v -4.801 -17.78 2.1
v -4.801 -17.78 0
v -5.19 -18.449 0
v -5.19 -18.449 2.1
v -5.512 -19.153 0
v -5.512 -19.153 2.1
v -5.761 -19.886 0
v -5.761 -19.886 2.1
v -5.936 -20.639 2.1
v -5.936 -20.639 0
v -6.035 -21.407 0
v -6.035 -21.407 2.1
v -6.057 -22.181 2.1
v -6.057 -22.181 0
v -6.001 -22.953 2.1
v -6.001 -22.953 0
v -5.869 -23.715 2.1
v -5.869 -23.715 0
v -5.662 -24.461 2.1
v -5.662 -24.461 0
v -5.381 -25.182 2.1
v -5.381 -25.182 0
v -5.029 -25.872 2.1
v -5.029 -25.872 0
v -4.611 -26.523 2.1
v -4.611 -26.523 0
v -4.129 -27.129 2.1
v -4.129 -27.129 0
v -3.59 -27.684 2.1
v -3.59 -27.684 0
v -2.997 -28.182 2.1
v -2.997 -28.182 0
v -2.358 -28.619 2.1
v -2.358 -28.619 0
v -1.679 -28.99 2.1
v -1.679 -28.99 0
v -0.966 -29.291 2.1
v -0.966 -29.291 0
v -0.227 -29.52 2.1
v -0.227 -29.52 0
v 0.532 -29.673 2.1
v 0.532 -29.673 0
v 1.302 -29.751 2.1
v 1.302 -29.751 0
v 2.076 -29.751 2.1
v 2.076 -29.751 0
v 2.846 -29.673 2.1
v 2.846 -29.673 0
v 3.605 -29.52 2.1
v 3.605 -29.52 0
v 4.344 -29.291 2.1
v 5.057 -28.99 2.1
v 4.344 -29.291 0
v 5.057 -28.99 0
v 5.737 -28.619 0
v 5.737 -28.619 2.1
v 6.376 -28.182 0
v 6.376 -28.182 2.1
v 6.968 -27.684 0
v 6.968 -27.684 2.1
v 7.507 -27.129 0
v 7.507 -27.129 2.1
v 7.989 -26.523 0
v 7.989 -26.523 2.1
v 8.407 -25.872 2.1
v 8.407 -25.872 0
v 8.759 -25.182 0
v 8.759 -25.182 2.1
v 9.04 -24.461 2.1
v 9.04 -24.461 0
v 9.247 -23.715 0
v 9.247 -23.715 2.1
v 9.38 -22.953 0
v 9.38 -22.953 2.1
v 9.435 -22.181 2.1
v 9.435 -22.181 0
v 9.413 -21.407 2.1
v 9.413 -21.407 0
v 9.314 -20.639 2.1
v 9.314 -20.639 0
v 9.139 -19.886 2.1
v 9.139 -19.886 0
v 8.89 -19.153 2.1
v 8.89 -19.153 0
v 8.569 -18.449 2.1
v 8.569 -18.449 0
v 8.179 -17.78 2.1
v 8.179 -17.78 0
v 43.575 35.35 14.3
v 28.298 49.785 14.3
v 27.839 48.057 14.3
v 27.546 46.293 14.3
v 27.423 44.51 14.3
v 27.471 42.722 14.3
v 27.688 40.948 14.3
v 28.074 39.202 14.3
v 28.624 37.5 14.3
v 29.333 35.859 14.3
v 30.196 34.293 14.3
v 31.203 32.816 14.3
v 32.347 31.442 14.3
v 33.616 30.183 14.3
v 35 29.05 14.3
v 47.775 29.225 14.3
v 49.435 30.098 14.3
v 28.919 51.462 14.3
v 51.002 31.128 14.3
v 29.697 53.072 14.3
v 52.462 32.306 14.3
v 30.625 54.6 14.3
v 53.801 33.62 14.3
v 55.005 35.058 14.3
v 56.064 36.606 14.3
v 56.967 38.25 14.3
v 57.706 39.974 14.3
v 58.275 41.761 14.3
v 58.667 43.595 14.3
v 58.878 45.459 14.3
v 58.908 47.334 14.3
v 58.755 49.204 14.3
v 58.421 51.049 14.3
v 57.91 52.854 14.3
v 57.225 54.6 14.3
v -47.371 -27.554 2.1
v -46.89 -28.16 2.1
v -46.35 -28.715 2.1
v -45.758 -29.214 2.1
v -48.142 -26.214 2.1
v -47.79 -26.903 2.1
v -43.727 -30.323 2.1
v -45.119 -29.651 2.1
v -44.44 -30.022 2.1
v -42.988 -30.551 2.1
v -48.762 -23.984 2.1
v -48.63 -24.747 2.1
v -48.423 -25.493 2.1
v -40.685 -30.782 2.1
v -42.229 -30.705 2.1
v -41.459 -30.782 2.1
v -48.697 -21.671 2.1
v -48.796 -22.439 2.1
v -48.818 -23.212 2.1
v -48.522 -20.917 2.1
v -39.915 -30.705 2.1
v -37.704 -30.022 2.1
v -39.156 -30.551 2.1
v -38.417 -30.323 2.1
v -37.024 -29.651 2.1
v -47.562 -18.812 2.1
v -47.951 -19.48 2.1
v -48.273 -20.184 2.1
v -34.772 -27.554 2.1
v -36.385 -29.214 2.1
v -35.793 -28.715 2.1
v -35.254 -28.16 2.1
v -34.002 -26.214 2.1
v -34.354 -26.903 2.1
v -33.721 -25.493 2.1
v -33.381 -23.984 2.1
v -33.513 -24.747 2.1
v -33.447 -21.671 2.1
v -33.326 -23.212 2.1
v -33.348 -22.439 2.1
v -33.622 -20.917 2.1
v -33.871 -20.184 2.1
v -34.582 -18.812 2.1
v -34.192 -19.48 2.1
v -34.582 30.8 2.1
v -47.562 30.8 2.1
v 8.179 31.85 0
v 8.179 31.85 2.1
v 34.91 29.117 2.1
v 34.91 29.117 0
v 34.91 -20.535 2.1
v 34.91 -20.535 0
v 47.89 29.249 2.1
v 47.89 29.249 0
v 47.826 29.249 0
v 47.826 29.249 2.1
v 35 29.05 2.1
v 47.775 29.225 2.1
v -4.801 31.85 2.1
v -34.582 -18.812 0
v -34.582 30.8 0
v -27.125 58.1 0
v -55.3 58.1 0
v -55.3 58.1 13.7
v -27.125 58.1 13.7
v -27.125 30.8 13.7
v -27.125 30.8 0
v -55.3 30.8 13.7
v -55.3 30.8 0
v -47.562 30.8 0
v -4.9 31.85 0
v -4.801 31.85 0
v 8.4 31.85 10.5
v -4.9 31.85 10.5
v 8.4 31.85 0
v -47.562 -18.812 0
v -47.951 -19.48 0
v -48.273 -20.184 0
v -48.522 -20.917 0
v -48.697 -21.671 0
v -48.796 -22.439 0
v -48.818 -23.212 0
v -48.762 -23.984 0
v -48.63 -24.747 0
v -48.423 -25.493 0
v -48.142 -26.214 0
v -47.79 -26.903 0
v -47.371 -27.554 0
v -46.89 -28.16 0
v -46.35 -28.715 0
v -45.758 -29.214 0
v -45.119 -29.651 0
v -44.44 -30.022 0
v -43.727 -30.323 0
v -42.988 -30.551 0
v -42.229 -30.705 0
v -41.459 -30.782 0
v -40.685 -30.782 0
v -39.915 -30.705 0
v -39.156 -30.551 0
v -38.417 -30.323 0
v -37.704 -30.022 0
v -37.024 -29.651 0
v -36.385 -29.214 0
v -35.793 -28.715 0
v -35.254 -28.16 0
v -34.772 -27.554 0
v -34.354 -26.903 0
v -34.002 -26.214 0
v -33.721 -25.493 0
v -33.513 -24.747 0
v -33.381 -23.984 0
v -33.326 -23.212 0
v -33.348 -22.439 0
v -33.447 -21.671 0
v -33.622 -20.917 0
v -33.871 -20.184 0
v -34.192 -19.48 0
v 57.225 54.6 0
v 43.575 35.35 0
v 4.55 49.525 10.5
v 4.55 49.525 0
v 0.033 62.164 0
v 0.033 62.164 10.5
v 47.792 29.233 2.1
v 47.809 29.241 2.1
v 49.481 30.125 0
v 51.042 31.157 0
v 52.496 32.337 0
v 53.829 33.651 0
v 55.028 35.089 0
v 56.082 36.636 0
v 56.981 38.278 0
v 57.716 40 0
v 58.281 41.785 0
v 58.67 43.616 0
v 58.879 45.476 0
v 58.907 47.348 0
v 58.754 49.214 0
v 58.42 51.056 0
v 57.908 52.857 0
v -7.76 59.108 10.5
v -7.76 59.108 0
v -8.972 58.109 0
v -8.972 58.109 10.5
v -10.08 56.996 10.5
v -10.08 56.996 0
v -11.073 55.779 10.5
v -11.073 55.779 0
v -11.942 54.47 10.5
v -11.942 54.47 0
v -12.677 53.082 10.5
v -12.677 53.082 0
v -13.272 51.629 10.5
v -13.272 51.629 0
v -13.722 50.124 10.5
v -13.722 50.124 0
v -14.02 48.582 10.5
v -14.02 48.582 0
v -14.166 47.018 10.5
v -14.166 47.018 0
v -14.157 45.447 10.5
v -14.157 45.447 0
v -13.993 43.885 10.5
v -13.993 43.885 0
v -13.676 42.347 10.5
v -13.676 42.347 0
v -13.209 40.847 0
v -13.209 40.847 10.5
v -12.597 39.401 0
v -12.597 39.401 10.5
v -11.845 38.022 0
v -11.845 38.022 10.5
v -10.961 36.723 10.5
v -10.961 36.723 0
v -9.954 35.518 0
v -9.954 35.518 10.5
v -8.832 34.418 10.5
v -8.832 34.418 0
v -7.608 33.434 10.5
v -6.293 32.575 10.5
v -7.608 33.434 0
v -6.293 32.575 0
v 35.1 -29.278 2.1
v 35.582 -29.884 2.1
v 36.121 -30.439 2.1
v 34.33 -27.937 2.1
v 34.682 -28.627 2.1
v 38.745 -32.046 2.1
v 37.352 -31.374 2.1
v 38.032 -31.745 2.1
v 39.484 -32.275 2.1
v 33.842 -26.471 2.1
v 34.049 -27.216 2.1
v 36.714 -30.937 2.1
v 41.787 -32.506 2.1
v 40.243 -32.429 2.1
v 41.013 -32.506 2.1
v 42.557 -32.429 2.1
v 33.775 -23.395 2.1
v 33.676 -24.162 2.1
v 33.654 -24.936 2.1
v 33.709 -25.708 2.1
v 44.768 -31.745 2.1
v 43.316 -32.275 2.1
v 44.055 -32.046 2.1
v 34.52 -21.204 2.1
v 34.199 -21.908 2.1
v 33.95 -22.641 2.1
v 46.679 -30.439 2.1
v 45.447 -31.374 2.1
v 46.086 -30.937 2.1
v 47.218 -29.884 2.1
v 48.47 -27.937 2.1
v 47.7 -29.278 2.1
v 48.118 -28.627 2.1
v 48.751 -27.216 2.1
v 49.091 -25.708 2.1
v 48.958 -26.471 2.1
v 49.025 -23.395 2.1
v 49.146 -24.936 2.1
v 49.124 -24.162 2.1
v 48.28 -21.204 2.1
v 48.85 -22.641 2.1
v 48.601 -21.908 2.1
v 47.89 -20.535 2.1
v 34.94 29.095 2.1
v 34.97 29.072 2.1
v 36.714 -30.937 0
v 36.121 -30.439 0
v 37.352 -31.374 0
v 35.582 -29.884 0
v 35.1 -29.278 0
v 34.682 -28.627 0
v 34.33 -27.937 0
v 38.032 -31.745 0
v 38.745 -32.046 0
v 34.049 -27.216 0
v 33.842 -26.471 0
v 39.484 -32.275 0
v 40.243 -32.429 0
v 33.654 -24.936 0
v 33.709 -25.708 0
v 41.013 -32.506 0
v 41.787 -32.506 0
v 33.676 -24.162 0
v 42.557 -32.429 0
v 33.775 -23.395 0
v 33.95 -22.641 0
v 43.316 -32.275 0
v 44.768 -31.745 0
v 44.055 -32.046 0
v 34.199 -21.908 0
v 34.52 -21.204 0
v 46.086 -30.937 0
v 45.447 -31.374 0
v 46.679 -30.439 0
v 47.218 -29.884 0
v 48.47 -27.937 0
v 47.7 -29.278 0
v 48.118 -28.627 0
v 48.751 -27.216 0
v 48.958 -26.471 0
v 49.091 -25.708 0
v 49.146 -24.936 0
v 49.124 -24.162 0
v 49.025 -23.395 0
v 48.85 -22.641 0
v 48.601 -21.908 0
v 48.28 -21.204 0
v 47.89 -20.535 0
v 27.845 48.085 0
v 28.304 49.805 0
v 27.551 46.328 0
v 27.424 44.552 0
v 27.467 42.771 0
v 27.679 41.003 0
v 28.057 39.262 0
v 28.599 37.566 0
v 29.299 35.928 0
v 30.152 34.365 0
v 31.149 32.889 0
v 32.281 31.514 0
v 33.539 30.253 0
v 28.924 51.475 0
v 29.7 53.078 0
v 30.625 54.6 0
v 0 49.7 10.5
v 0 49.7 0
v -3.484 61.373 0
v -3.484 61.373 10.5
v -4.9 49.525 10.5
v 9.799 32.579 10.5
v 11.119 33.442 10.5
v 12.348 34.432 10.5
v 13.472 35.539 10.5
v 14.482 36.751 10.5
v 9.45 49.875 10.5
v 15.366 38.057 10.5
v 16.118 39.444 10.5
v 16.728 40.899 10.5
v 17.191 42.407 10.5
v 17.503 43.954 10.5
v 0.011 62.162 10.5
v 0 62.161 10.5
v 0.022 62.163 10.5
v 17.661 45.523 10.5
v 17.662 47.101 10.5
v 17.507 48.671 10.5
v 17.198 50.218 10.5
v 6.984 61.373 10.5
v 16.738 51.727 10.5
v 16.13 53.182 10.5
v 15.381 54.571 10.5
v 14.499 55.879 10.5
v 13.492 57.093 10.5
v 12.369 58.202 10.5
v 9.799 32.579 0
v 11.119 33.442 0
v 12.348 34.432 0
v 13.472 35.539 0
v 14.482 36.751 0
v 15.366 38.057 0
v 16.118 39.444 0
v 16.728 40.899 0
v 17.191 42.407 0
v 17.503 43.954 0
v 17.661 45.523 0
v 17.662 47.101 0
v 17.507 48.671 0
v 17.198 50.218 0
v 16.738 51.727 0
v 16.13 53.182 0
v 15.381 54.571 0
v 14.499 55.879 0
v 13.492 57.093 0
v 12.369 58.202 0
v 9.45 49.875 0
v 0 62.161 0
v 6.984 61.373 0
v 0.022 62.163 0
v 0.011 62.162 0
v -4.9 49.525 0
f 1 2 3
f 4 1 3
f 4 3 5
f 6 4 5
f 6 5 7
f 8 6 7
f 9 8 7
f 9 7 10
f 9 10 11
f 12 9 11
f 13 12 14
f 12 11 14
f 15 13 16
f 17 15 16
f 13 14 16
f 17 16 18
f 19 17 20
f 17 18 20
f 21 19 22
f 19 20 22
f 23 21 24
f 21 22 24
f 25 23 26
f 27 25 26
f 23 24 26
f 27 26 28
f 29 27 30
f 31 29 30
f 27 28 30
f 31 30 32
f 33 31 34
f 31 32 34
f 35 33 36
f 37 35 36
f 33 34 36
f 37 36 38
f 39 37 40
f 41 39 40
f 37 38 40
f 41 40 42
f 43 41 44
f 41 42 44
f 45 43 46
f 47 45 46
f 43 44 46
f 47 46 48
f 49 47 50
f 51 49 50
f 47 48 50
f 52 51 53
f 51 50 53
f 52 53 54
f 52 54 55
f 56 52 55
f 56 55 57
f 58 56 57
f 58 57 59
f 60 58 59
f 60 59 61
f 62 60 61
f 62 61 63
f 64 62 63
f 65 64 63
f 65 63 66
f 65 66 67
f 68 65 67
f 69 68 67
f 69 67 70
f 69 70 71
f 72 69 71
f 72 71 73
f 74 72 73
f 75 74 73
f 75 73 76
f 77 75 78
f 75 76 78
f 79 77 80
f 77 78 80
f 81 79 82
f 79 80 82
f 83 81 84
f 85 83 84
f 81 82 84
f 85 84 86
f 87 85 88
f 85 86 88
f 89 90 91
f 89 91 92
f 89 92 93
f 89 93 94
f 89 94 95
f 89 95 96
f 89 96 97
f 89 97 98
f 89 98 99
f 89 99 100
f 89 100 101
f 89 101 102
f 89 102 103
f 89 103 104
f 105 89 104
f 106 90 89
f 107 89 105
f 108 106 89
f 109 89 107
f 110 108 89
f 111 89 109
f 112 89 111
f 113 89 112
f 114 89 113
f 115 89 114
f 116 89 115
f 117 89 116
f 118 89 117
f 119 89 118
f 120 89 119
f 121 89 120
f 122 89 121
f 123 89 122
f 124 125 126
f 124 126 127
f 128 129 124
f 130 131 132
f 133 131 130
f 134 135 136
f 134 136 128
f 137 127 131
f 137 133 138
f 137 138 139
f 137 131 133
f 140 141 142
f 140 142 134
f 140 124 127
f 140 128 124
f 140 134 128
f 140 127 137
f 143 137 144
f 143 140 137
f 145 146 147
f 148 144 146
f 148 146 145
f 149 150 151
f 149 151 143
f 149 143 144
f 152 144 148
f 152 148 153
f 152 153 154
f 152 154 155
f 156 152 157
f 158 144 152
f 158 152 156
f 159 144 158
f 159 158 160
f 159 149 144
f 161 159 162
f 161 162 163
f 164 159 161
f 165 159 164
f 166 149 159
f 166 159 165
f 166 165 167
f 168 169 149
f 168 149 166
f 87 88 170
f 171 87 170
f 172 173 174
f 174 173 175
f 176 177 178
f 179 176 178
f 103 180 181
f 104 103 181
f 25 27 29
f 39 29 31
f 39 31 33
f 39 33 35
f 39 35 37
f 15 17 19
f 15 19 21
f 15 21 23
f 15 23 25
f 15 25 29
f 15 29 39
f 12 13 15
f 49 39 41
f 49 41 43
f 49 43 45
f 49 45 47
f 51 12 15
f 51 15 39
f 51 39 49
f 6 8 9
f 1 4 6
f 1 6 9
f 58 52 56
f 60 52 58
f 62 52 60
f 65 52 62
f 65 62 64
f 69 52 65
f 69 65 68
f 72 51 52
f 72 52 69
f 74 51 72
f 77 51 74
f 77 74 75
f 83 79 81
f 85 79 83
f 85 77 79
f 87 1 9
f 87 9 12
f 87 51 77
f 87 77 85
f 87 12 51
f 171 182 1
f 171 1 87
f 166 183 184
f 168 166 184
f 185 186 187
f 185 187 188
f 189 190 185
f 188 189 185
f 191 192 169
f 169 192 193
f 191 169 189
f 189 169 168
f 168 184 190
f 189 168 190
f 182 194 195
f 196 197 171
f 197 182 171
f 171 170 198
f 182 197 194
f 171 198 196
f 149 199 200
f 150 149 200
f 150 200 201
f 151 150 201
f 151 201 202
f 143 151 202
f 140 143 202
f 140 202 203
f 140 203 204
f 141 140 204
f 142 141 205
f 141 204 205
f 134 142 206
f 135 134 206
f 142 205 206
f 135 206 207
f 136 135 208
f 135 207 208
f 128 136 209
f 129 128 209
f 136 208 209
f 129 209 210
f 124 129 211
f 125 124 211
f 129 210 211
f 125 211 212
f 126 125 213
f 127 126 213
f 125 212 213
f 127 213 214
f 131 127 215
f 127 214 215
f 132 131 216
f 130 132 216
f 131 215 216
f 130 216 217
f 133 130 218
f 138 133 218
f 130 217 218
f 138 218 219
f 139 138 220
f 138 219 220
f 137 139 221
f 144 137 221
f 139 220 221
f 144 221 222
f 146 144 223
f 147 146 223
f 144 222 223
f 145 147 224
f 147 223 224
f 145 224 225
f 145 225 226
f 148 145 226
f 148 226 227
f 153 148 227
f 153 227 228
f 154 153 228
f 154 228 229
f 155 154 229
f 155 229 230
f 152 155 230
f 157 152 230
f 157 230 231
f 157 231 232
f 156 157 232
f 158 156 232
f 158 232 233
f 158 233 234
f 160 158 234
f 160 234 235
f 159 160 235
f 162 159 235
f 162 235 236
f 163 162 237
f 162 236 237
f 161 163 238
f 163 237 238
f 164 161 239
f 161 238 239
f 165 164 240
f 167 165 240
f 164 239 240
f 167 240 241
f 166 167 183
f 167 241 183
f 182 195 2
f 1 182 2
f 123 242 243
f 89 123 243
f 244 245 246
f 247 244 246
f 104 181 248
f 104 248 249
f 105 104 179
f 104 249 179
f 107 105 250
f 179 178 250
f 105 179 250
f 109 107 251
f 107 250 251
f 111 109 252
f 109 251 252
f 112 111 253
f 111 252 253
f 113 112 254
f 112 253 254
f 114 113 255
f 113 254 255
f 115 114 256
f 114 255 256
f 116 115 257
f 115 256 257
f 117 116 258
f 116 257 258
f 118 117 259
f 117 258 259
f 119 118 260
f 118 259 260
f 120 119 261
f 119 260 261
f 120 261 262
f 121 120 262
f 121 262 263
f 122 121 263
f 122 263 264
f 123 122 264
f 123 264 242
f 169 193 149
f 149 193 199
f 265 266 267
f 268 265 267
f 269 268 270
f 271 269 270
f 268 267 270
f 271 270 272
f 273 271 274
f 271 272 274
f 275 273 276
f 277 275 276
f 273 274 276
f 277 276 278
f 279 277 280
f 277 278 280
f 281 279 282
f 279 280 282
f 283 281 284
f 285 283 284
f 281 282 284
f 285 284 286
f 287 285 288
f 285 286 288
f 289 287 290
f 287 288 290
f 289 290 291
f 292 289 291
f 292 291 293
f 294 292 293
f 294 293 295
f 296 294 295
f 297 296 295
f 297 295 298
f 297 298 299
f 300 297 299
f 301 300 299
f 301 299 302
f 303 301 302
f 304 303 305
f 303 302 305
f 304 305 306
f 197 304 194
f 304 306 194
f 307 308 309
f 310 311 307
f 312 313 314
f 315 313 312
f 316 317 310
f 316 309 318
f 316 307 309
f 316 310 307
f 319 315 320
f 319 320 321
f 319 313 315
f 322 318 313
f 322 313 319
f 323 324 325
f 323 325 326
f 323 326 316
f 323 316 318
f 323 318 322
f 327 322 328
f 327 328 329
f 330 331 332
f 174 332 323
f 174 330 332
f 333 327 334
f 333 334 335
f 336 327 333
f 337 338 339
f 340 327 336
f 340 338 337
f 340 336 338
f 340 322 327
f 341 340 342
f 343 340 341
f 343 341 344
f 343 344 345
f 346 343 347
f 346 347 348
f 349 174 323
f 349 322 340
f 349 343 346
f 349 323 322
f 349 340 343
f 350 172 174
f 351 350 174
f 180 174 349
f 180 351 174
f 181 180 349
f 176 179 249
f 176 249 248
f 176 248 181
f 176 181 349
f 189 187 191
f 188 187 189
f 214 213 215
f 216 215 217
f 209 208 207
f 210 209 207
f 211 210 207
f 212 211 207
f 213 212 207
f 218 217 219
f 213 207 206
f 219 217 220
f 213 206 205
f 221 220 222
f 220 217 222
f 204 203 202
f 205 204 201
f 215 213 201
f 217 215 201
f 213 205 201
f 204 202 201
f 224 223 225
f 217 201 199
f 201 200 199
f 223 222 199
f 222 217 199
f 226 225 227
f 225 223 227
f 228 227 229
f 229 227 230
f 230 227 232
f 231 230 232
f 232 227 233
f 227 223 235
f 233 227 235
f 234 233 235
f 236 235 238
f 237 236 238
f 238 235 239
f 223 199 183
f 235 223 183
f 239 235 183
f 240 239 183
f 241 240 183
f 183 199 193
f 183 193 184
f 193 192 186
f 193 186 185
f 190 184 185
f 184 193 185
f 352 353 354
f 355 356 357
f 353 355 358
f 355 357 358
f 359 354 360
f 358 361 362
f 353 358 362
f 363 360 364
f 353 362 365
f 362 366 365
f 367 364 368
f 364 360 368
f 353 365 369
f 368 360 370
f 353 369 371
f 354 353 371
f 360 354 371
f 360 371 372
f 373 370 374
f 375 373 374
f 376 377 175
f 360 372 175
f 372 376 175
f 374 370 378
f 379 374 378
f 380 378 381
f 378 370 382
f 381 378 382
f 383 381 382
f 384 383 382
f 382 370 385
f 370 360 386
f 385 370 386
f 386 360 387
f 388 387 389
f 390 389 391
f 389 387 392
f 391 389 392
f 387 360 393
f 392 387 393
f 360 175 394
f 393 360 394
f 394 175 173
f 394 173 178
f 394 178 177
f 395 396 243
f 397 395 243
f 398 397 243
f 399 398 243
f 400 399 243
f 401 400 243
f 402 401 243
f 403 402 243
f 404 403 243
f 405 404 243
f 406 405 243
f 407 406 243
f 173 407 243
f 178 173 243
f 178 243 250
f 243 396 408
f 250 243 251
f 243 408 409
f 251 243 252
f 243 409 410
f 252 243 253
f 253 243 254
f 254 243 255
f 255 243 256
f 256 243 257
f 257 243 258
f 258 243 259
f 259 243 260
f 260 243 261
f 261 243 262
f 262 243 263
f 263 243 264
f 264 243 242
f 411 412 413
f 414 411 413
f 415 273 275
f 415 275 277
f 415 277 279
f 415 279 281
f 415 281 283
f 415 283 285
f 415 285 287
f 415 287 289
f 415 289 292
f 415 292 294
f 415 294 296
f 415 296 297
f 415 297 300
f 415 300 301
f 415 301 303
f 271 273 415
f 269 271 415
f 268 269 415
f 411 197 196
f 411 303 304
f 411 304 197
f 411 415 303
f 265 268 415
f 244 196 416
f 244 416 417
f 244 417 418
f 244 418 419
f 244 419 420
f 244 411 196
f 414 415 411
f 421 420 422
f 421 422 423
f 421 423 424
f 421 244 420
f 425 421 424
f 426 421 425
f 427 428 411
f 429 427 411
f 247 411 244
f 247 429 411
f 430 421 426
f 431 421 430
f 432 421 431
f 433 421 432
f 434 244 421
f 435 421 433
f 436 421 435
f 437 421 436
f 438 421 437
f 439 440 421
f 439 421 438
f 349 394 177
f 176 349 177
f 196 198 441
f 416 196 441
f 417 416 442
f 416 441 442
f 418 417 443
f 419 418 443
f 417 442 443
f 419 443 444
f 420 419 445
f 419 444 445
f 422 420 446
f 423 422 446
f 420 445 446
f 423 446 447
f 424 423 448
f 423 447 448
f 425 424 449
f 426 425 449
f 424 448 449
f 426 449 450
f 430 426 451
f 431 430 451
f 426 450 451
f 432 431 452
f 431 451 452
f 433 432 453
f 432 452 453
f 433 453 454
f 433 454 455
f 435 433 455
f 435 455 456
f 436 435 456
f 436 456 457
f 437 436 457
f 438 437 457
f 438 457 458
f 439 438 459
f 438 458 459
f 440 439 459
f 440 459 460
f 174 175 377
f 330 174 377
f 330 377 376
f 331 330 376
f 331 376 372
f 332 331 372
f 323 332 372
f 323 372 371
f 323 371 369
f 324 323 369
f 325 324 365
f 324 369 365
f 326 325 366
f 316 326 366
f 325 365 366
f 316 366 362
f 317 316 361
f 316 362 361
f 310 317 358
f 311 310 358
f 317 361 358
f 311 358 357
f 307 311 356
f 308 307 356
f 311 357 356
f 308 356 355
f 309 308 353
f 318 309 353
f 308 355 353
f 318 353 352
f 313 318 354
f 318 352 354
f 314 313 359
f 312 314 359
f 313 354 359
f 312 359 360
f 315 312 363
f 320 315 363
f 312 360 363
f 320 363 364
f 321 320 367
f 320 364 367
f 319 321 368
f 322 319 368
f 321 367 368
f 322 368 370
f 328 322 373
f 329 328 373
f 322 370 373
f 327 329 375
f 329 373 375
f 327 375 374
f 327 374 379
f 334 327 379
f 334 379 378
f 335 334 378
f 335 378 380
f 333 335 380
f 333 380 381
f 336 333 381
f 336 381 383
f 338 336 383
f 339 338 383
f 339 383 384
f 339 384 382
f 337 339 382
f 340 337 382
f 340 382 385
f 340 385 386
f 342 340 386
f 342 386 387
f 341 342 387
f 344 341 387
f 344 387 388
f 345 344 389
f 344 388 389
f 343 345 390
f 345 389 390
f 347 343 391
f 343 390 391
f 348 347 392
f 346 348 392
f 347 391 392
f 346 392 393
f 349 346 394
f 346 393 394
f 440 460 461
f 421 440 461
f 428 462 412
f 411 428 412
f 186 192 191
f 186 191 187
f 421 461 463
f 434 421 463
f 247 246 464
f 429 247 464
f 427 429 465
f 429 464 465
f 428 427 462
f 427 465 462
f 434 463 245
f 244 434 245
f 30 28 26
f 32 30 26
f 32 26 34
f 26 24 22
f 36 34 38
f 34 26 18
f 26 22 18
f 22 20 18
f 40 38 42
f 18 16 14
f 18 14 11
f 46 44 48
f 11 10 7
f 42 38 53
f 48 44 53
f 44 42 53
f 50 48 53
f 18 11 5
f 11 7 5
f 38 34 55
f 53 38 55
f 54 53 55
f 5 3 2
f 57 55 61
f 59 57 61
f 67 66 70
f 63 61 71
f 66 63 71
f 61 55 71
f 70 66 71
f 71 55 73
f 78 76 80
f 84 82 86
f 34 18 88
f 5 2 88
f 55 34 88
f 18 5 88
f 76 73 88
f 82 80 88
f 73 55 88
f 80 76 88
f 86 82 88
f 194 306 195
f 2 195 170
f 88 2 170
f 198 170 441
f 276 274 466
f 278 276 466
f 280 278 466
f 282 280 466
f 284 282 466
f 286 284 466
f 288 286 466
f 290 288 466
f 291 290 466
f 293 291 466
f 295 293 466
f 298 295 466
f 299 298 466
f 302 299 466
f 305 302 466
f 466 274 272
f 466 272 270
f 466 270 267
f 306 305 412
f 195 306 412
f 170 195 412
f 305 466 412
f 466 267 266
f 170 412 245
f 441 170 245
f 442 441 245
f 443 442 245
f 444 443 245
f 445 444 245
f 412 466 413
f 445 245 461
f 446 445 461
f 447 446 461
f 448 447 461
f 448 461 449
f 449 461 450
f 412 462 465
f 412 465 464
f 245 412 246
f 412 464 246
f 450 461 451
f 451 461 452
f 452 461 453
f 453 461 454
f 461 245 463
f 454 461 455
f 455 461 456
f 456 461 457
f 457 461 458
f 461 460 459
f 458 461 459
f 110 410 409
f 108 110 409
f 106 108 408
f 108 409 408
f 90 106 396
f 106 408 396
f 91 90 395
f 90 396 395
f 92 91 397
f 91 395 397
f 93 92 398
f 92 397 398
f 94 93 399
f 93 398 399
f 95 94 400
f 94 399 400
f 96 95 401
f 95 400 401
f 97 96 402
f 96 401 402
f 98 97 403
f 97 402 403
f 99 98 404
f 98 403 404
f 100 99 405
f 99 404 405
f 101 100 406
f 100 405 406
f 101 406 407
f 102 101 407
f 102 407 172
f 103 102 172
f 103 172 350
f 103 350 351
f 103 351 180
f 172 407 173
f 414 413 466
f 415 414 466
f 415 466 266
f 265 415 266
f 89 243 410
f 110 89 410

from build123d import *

# Parameters (mm, degrees)
F1_DEPTH  = 2.1
F3_DEPTH  = 2.1
F7_DEPTH  = 10.5
F6_W      = 28.175
F6_H      = 27.299998
F8_DEPTH  = 13.7
F9_DEPTH  = 2.1
F11_DEPTH = 14.3


with BuildPart() as f1:
    # F0 (on Top) → F1 (new body)
    with BuildSketch(Plane.XY):
        with BuildLine():
            Line((-4.8006, 32.004002), (-4.8006, -17.78))
            ThreePointArc((-4.8006, -17.78), (1.6891, -29.760286), (8.1788, -17.78))
            Line((8.1788, -17.78), (8.1788, 32.004002))
            Line((8.1788, 32.004002), (-4.8006, 32.004002))
        make_face()
    extrude(amount=F1_DEPTH)

    # F5 (on Top) → F7 (join)
    with BuildSketch(Plane.XY):
        with BuildLine():
            Line((-4.9, 31.850003), (8.400001, 31.850003))
            ThreePointArc((8.400001, 31.850003), (17.503072, 43.953521), (12.369412, 58.201559))
            Line((12.369412, 58.201559), (9.45, 49.875002))
            Line((9.45, 49.875002), (6.983557, 61.373044))
            Line((6.983557, 61.373044), (4.549999, 49.525004))
            Line((4.549999, 49.525004), (0.033156, 62.16446))
            ThreePointArc((0.033156, 62.16446), (0.016577, 62.162654), (0, 62.160831))
            Line((0, 62.160831), (0, 49.699999))
            Line((0, 49.699999), (-3.483556, 61.373044))
            Line((-3.483556, 61.373044), (-4.9, 49.525004))
            Line((-4.9, 49.525004), (-7.759687, 59.107528))
            ThreePointArc((-7.759687, 59.107528), (-14.093833, 44.664217), (-4.9, 31.850003))
        make_face()
    extrude(amount=F7_DEPTH)


with BuildPart() as f3:
    # F2 (on Top) → F3 (new body)
    with BuildSketch(Plane.XY):
        with BuildLine():
            Line((-47.561502, 30.972379), (-47.561502, -18.811624))
            ThreePointArc((-47.561502, -18.811624), (-41.071802, -30.79191), (-34.582102, -18.811624))
            Line((-34.582102, -18.811624), (-34.582102, 30.972379))
            Line((-34.582102, 30.972379), (-47.561502, 30.972379))
        make_face()
    extrude(amount=F3_DEPTH)

    # F6 (on Top) → F8 (join)
    with BuildSketch(Plane.XY):
        with Locations((-41.212501, 44.450001)):
            Rectangle(F6_W, F6_H)
    extrude(amount=F8_DEPTH)


with BuildPart() as f9:
    # F4 (on Top) → F9 (new body)
    with BuildSketch(Plane.XY):
        with BuildLine():
            Line((34.91028, 29.248873), (34.91028, -20.53513))
            ThreePointArc((34.91028, -20.53513), (41.39998, -32.515416), (47.88968, -20.53513))
            Line((47.88968, -20.53513), (47.88968, 29.248873))
            Line((47.88968, 29.248873), (34.91028, 29.248873))
        make_face()
    extrude(amount=F9_DEPTH)

    # F10 (on Top) → F11 (join)
    with BuildSketch(Plane.XY):
        with BuildLine():
            Line((43.575, 35.350002), (30.625002, 54.6))
            ThreePointArc((30.625002, 54.6), (27.688326, 40.947573), (35, 29.05))
            Line((35, 29.05), (47.775004, 29.225003))
            ThreePointArc((47.775004, 29.225003), (57.706449, 39.97355), (57.225004, 54.6))
            Line((57.225004, 54.6), (43.575, 35.350002))
        make_face()
    extrude(amount=F11_DEPTH)


solid = Compound([f1.part, f3.part, f9.part])
